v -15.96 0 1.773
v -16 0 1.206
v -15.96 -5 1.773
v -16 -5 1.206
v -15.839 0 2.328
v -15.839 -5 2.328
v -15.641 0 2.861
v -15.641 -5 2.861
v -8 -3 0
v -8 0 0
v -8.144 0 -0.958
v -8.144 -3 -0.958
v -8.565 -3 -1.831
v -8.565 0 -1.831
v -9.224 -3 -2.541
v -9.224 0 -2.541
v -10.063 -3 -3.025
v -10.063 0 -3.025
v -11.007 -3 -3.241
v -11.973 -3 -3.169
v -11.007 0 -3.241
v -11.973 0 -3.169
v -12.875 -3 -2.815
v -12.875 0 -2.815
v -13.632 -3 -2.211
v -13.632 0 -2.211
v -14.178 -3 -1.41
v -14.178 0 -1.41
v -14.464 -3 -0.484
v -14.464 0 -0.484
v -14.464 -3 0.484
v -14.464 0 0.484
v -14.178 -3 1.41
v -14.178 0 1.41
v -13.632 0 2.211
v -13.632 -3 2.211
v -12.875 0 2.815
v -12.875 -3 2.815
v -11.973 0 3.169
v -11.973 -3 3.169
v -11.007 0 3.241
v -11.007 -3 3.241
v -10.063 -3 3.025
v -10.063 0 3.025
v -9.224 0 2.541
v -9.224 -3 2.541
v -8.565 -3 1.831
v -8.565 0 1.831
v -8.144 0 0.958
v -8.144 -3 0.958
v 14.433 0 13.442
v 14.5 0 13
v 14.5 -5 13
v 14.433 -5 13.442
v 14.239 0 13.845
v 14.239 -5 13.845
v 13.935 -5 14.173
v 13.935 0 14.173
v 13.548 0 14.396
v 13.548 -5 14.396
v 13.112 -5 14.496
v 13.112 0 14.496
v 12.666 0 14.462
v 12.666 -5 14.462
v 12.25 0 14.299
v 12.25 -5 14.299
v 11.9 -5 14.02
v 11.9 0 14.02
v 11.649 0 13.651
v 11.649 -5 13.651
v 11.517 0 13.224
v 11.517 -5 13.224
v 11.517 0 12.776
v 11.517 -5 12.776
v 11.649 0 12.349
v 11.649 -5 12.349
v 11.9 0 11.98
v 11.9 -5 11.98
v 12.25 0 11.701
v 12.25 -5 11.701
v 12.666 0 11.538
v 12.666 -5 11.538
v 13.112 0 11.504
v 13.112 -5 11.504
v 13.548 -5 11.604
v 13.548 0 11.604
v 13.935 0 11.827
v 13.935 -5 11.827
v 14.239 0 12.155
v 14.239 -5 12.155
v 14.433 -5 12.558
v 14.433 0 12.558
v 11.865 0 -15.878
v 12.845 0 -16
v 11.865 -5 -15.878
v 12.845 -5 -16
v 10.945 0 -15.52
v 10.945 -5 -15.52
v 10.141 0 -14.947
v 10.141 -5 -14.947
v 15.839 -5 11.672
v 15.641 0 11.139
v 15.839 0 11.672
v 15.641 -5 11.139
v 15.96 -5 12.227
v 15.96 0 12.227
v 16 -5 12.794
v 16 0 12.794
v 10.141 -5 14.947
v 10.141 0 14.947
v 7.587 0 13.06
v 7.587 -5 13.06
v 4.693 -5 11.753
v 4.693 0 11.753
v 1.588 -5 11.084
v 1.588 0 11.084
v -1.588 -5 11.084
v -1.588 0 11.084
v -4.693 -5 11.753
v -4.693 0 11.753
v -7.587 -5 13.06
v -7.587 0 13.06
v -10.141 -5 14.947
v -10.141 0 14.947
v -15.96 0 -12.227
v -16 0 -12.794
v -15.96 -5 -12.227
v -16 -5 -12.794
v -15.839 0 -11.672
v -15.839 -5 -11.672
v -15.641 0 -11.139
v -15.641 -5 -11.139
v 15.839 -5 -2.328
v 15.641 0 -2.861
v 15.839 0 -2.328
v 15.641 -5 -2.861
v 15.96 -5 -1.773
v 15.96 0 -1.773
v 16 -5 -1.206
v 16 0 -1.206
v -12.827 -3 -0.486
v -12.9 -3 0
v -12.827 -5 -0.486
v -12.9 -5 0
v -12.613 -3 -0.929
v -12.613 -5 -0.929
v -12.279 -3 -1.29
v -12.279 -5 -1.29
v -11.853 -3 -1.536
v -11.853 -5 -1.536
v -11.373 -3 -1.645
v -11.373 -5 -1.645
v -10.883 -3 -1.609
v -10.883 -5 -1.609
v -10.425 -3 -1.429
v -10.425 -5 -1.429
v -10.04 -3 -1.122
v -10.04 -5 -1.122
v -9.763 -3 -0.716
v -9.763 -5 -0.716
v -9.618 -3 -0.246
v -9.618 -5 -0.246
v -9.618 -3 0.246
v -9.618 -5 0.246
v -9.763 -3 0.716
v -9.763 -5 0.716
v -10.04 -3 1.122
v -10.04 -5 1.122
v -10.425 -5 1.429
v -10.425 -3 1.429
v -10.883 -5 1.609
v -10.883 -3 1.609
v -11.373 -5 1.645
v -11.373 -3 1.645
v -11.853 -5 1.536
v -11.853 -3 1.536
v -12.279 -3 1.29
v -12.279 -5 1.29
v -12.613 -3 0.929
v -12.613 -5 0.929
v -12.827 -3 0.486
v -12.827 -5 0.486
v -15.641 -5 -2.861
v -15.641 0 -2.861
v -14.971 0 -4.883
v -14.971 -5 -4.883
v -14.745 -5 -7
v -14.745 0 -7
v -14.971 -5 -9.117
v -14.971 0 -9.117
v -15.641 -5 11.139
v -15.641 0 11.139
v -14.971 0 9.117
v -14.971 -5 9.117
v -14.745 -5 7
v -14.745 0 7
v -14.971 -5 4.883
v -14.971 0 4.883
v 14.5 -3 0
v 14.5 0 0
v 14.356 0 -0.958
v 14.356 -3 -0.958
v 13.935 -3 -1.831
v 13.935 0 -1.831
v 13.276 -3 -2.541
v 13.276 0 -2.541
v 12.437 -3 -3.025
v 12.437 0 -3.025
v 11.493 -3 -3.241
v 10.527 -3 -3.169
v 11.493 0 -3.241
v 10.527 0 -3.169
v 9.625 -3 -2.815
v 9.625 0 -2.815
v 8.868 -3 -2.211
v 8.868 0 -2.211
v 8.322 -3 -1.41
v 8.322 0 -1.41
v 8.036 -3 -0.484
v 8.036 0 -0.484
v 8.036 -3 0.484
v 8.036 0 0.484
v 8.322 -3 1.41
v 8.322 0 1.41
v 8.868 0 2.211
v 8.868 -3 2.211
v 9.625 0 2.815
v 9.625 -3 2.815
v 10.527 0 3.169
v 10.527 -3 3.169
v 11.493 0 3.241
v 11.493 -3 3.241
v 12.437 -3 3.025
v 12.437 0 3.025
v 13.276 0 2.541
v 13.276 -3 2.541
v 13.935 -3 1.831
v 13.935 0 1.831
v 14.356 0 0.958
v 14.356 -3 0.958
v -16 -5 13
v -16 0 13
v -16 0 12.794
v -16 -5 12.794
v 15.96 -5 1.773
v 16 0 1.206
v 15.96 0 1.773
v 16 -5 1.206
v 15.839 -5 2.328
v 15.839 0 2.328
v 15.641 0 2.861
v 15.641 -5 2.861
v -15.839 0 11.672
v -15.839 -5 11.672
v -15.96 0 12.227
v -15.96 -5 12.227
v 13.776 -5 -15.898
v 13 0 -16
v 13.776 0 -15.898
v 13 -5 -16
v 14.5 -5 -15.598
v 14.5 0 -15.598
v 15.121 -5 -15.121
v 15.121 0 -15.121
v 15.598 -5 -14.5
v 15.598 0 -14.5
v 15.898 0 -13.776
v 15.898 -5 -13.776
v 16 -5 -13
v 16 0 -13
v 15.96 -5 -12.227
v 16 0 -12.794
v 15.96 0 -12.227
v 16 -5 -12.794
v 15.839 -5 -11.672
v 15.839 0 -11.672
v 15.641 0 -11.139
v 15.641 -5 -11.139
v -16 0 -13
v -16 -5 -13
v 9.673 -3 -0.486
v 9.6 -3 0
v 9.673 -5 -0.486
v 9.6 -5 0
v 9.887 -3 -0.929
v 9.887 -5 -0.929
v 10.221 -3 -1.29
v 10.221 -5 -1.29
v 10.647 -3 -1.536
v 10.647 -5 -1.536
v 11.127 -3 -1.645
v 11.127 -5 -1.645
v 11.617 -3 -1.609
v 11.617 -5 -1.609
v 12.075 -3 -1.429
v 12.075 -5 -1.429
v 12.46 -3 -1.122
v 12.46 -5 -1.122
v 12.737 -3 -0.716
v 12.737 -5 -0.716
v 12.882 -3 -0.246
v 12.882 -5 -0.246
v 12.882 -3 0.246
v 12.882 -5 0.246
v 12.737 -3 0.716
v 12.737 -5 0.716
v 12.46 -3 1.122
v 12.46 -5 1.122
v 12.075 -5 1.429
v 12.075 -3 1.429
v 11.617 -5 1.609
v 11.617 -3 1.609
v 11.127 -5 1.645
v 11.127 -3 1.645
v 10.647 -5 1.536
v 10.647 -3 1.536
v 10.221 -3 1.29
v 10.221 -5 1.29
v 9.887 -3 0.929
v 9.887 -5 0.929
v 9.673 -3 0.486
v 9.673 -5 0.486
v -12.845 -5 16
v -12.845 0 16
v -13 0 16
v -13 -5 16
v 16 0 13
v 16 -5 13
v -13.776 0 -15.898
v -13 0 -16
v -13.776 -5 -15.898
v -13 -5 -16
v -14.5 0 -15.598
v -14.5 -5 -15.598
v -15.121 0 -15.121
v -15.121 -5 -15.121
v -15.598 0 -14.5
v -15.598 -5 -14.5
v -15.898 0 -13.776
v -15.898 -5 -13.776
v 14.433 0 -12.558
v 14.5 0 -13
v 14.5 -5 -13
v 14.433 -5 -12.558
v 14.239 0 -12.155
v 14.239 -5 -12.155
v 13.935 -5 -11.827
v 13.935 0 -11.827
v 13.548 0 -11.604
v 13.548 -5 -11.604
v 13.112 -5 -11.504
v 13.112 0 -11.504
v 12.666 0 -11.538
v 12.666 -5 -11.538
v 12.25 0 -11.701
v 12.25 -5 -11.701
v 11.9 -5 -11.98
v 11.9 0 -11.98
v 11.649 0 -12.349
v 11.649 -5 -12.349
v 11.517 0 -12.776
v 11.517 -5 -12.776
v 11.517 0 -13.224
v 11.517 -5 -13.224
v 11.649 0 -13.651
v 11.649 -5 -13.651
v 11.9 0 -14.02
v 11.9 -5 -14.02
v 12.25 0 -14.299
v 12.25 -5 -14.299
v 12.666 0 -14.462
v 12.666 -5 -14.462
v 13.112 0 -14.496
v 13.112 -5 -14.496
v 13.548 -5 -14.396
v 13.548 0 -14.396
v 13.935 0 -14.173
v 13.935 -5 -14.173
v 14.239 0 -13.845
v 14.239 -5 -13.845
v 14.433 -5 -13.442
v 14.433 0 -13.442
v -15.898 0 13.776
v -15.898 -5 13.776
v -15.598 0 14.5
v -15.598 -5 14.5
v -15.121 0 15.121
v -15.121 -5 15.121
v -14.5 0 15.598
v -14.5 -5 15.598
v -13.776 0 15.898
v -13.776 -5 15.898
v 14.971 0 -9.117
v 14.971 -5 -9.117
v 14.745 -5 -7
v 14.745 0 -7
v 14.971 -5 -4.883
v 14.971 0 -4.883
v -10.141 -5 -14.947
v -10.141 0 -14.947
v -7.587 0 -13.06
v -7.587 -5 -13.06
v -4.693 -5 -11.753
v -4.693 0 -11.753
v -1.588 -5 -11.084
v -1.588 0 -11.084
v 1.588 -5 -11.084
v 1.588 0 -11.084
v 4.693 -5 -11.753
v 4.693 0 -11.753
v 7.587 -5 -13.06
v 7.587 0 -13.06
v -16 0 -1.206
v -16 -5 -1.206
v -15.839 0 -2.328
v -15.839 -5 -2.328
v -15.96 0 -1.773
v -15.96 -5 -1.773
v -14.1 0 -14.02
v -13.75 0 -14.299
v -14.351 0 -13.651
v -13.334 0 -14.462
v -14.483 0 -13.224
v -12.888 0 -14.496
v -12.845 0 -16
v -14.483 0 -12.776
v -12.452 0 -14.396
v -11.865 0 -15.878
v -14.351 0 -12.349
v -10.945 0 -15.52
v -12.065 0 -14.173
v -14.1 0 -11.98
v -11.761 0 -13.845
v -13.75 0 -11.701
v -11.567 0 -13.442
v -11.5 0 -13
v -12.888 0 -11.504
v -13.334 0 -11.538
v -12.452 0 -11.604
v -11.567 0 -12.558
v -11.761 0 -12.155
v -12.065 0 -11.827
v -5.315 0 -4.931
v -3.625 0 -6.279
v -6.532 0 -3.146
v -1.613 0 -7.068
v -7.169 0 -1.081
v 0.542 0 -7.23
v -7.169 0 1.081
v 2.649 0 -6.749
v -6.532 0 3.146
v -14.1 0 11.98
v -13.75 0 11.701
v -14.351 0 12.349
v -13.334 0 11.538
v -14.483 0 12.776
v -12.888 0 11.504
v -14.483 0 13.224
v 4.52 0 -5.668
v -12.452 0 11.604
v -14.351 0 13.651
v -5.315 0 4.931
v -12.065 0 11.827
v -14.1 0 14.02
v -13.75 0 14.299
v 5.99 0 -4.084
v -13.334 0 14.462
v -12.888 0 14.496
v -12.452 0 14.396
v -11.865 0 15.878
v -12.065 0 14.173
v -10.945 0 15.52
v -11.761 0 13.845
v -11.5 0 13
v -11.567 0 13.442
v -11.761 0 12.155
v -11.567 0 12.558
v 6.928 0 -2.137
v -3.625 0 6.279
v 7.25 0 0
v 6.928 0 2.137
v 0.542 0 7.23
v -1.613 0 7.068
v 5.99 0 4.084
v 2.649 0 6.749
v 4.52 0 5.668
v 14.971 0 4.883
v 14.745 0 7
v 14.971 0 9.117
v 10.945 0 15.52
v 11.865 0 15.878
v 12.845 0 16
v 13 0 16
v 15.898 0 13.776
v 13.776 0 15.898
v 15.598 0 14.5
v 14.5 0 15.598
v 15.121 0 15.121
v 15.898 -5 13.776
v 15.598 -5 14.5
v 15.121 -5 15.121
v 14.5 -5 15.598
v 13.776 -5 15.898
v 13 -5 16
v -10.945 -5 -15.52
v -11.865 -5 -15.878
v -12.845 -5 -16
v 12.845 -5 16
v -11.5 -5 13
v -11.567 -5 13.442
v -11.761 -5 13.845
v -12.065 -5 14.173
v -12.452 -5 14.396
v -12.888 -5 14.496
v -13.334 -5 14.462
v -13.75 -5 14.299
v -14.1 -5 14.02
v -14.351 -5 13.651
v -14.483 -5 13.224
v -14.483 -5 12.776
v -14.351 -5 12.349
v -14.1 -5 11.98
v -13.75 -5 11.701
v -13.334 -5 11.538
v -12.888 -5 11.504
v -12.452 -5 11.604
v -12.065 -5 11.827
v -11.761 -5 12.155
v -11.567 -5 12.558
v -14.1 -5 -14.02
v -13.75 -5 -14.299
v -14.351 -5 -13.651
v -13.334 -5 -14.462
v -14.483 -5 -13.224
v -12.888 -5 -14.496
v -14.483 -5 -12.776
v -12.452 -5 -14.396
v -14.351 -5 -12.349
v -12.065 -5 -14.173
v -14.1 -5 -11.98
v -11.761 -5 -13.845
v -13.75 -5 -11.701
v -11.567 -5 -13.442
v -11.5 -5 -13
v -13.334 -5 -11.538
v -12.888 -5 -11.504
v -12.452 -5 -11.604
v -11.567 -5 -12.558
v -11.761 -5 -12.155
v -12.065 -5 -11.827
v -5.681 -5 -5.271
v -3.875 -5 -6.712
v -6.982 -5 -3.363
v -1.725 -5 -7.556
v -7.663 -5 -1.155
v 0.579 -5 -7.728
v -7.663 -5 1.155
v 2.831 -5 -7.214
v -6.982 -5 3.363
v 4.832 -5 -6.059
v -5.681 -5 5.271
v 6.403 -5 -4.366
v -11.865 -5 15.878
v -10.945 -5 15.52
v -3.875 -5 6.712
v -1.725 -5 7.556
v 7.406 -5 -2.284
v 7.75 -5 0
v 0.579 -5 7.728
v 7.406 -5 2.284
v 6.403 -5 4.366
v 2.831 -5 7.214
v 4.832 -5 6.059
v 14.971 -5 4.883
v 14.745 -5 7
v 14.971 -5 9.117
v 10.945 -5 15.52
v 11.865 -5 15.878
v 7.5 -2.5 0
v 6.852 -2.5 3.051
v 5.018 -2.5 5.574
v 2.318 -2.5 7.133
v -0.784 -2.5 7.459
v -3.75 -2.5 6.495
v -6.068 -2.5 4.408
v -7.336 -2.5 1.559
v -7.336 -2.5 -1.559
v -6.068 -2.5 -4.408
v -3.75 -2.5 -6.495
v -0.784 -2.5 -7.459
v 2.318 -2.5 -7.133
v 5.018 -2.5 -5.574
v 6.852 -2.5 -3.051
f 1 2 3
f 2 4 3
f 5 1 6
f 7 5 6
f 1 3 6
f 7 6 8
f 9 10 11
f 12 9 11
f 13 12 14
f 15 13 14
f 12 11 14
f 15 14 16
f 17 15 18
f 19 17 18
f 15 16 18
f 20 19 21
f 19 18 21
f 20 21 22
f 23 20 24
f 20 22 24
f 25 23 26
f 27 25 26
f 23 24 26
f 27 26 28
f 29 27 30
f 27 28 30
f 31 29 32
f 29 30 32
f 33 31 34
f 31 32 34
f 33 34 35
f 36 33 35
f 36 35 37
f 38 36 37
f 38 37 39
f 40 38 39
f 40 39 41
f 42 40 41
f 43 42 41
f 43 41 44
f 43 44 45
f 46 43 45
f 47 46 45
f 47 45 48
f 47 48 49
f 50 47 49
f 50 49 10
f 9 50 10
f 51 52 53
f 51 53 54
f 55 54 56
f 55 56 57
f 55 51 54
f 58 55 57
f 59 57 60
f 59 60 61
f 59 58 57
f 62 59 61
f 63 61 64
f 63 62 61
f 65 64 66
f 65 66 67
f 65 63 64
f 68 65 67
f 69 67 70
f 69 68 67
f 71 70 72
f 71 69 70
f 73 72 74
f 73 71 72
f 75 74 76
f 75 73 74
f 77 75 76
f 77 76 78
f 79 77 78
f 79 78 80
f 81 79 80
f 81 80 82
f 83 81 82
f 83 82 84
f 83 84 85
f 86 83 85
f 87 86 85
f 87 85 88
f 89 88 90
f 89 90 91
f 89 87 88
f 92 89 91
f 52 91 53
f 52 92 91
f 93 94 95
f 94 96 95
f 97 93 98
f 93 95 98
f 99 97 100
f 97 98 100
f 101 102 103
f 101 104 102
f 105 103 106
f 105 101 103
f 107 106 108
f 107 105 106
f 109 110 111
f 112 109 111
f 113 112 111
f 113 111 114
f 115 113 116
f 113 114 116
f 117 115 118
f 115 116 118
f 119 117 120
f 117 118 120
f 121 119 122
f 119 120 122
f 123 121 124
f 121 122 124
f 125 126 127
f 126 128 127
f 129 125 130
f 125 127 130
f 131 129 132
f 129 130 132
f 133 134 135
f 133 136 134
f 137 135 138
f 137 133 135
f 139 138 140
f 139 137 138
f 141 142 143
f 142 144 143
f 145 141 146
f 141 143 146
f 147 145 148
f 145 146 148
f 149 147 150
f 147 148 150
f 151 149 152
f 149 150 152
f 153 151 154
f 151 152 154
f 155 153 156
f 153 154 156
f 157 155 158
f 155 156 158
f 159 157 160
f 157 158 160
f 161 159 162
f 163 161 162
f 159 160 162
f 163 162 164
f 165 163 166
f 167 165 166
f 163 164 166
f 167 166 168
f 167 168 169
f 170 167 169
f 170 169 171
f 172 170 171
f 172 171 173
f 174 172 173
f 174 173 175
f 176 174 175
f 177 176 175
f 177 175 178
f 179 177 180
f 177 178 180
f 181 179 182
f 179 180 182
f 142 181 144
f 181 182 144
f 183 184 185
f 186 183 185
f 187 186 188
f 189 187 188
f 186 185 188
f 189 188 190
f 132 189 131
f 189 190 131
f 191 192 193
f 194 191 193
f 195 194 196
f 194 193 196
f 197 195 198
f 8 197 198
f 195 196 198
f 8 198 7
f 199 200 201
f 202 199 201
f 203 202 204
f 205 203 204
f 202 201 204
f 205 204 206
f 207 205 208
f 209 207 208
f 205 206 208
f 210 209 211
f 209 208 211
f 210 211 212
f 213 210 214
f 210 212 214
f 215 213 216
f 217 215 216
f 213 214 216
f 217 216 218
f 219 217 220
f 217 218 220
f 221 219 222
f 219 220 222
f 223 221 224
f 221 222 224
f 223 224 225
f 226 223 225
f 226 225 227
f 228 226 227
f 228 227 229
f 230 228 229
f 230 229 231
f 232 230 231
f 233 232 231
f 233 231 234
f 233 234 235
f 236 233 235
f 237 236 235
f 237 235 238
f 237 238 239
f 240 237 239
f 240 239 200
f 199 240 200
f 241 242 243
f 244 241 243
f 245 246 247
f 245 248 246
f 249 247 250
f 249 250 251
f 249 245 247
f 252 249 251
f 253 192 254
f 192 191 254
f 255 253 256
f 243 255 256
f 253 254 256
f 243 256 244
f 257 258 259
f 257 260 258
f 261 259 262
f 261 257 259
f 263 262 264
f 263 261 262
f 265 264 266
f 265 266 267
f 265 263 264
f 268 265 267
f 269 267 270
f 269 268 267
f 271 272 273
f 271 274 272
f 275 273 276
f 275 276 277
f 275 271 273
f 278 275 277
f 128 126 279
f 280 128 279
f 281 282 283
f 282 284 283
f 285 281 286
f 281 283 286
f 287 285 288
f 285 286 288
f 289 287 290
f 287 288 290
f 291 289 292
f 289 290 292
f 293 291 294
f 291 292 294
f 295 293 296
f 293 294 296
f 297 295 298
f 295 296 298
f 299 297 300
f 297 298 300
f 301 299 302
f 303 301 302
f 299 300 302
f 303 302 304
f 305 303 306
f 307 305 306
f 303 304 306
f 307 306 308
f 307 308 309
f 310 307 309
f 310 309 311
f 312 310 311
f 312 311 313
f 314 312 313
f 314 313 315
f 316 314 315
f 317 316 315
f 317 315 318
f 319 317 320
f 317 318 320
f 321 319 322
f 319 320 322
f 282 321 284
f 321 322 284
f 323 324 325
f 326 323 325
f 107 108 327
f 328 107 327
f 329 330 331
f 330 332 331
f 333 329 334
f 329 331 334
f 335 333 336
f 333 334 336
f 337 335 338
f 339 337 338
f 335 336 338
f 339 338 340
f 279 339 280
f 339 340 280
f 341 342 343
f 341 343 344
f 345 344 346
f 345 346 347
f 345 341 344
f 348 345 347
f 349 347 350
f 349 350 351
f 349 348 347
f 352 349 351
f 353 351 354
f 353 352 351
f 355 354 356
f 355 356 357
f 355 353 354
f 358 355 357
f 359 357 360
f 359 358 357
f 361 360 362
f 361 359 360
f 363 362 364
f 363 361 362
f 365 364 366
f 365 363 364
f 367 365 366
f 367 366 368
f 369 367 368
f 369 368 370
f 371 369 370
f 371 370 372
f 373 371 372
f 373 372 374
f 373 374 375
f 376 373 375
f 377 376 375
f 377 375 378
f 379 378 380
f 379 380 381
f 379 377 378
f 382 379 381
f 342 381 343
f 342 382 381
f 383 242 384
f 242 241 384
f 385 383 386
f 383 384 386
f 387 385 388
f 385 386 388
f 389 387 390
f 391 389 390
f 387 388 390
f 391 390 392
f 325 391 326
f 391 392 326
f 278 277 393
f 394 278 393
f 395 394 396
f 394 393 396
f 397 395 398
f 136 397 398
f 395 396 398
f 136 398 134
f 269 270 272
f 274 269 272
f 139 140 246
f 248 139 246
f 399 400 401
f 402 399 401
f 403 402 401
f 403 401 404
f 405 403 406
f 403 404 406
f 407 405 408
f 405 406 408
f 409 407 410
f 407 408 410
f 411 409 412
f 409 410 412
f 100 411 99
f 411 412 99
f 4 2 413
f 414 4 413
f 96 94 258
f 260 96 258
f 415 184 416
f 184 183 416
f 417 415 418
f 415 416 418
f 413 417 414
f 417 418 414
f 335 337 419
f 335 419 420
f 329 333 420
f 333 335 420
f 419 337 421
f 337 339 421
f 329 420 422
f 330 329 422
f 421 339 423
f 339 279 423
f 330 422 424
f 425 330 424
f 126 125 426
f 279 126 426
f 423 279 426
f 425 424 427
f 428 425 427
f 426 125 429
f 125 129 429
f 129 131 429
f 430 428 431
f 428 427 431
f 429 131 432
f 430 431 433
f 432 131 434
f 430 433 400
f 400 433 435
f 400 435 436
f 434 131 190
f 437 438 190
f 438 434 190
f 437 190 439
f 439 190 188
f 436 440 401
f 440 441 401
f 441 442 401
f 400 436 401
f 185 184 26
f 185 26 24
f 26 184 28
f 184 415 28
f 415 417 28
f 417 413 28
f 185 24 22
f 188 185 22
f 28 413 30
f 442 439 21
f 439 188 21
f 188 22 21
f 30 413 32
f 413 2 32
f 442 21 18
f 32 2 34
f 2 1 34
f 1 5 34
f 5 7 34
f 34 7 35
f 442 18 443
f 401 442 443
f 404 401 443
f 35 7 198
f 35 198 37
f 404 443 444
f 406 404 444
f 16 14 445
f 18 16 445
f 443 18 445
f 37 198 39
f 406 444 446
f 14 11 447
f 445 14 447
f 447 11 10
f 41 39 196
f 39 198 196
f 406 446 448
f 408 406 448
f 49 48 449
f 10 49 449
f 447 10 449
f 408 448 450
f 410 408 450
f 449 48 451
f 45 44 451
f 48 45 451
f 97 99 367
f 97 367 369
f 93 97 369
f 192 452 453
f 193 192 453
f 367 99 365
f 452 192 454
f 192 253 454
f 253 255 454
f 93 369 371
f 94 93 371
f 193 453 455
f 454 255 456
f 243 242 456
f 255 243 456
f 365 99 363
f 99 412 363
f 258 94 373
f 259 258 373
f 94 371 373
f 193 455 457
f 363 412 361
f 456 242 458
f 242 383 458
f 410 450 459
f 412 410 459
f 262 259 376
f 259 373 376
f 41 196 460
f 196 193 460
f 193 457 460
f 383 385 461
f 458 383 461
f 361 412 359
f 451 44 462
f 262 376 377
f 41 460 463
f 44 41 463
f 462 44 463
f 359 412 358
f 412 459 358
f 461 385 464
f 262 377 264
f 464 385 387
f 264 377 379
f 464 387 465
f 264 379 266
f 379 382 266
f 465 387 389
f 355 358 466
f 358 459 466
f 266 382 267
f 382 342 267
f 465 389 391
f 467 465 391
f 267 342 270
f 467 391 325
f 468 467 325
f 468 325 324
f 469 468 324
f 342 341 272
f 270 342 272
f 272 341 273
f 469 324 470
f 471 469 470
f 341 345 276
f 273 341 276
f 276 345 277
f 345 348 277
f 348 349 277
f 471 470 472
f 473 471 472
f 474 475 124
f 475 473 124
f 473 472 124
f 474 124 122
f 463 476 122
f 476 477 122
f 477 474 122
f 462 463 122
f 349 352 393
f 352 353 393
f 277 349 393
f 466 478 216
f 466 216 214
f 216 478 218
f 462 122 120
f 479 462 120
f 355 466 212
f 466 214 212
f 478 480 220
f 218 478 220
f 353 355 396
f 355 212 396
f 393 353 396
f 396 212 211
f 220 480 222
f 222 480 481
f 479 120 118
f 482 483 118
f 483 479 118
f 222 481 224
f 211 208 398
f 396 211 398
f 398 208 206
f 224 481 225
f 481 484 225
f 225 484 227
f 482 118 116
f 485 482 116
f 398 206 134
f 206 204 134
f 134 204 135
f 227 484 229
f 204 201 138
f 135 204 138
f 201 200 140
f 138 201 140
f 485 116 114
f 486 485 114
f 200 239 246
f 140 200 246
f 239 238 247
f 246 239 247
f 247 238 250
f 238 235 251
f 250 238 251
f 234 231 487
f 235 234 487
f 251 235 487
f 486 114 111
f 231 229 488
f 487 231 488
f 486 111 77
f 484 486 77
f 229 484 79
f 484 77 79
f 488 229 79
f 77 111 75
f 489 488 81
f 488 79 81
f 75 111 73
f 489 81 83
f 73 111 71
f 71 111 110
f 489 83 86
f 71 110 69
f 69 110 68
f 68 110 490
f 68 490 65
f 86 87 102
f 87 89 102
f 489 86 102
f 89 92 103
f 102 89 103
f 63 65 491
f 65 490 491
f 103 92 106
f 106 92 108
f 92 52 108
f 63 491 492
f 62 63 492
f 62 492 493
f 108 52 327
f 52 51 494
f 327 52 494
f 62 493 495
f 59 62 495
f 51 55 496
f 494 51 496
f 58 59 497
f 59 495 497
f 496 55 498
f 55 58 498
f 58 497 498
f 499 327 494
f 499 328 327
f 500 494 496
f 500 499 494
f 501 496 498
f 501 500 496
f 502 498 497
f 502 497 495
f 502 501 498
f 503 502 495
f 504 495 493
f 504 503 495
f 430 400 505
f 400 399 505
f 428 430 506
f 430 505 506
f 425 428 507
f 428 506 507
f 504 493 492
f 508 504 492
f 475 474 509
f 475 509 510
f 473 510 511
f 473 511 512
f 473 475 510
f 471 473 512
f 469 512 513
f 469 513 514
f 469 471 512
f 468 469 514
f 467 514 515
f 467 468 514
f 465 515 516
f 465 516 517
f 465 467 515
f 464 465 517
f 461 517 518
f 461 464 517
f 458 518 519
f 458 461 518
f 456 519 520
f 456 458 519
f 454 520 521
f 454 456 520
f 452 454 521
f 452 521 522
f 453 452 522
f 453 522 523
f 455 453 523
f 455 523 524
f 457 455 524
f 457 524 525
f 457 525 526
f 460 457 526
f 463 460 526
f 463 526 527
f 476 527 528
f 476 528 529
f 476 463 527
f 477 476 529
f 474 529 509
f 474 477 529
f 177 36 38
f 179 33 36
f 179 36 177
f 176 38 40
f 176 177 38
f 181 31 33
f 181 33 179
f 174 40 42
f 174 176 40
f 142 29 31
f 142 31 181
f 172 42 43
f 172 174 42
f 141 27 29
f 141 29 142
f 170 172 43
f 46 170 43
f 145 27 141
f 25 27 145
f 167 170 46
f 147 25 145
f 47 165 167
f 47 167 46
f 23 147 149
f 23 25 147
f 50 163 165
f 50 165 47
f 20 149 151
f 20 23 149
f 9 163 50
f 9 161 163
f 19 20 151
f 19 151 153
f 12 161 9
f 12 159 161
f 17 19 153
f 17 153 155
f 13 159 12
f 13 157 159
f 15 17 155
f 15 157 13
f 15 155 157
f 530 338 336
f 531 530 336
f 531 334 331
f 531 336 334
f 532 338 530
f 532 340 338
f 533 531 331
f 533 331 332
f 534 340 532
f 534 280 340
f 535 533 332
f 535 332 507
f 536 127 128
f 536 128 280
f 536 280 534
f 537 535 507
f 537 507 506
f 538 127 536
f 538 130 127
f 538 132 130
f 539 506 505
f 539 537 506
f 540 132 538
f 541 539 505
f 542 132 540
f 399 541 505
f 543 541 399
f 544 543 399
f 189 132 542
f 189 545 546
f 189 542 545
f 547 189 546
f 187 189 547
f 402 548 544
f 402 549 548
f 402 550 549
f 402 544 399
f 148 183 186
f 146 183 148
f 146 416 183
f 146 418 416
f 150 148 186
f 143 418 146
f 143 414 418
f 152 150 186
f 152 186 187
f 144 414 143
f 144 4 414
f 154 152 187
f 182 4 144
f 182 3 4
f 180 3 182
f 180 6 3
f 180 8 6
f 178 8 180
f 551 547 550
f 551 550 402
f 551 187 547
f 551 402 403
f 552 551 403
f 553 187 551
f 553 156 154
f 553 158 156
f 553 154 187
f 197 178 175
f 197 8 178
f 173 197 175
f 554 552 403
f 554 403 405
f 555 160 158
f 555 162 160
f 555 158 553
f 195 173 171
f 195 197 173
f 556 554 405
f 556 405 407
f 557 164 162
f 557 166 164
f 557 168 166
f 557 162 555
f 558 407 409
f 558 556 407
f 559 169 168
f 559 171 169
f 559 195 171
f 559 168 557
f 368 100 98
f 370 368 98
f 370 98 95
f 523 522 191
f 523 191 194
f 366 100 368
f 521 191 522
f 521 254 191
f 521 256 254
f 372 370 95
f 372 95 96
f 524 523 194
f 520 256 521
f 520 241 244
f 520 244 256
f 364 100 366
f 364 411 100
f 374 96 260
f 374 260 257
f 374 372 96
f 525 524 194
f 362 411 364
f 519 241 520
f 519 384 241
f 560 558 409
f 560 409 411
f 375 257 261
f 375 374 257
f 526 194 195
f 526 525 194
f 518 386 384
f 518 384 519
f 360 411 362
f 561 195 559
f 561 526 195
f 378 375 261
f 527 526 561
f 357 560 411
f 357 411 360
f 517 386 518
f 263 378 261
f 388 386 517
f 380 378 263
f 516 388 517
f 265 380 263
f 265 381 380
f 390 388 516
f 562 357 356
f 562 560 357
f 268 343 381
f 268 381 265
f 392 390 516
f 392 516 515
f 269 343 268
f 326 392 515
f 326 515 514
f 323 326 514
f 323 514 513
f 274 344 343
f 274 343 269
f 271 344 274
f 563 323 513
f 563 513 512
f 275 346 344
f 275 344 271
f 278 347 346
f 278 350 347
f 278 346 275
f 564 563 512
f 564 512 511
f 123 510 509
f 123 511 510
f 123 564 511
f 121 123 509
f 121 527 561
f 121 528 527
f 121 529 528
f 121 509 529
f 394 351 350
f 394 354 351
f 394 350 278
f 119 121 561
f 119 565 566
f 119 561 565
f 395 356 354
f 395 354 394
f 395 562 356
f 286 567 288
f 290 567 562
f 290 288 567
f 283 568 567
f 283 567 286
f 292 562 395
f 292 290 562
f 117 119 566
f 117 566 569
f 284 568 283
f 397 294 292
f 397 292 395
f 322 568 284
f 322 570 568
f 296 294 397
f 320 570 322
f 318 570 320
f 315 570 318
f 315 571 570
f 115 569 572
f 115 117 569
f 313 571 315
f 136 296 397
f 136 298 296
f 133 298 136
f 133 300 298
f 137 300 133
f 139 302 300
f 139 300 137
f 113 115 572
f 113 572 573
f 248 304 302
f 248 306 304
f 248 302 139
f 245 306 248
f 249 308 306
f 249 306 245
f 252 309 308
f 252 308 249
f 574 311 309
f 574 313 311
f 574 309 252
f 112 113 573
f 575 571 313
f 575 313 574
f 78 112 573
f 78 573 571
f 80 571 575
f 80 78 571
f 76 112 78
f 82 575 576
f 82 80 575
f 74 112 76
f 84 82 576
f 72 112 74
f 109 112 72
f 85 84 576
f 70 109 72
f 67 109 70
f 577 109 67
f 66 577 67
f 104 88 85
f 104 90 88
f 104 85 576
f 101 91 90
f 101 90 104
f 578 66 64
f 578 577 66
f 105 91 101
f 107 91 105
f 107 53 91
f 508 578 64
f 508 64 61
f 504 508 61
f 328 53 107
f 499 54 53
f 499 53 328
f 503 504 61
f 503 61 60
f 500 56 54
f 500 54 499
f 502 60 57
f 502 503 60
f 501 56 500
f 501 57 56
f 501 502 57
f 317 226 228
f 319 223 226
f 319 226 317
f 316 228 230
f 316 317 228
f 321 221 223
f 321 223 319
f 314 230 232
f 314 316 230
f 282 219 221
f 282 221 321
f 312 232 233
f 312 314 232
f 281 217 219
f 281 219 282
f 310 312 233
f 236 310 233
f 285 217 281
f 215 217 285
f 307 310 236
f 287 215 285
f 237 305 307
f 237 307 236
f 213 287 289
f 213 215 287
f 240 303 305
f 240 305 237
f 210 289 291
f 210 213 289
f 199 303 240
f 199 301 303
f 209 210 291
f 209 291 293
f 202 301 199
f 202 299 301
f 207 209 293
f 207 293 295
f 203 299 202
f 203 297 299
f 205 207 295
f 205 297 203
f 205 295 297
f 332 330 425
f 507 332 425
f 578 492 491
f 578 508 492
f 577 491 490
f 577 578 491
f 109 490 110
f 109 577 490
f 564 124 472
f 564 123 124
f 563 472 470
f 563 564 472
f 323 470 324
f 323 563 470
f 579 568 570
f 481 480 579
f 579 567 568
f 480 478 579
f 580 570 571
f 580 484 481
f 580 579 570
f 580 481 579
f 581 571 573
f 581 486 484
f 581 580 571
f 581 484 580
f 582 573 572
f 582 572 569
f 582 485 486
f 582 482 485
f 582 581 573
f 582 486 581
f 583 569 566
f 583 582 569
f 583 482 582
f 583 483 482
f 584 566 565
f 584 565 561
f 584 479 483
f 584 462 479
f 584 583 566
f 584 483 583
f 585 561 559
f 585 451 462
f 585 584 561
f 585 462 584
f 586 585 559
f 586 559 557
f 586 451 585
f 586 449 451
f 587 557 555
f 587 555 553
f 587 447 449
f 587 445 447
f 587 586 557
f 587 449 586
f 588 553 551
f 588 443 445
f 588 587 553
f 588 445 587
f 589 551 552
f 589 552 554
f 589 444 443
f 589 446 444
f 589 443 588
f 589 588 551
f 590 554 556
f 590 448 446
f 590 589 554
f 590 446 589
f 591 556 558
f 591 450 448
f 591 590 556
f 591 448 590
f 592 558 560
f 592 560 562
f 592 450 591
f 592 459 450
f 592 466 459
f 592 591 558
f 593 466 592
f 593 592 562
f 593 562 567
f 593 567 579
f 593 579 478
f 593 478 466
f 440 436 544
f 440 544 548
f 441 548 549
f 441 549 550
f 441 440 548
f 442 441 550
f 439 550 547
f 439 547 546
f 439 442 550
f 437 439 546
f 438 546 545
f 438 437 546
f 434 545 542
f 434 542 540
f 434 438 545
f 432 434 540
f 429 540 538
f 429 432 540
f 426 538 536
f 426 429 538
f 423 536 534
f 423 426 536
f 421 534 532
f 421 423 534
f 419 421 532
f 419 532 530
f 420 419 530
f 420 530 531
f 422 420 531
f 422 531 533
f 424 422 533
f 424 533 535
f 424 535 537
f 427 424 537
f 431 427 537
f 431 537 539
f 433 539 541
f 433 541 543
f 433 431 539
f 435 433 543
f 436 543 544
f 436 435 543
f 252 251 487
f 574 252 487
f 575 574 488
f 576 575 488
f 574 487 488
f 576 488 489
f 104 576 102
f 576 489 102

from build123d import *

# Parameters (mm, degrees)
F0_R           = 1.5
F0_R_2         = 7.25
F1_DEPTH       = 5
F2_R           = 3
F3_SIZE2       = 4.99999
F3_SIZE        = 0.49999
F4_D           = 3.3
F4_CBORE_D     = 6.5
F4_CBORE_DEPTH = 3
F5_R           = 4


# Not quite as in the source:
# - a fillet or chamfer is up to 0.001 mm smaller than in the source, because OpenCascade refuses the exact size


with BuildPart() as f1:
    # F0 (on Front) → F1 (new body)
    with BuildSketch(Plane.XZ):
        with BuildLine():
            Line((11.1803398875, -16), (16, -16))
            Line((16, -16), (16, -11.8509778157))
            ThreePointArc((16, -11.8509778157), (14.7445991464, -7), (16, -2.1490221843))
            Line((16, -2.1490221843), (16, 2.1490221843))
            ThreePointArc((16, 2.1490221843), (14.7445991464, 7), (16, 11.8509778157))
            Line((16, 11.8509778157), (16, 16))
            Line((16, 16), (11.1803398875, 16))
            ThreePointArc((11.1803398875, 16), (0, 11), (-11.1803398875, 16))
            Line((-11.1803398875, 16), (-16, 16))
            Line((-16, 16), (-16, 11.8509778157))
            ThreePointArc((-16, 11.8509778157), (-14.7445991464, 7), (-16, 2.1490221843))
            Line((-16, 2.1490221843), (-16, -2.1490221843))
            ThreePointArc((-16, -2.1490221843), (-14.7445991464, -7), (-16, -11.8509778157))
            Line((-16, -11.8509778157), (-16, -16))
            Line((-16, -16), (-11.1803398875, -16))
            ThreePointArc((-11.1803398875, -16), (0, -11), (11.1803398875, -16))
        make_face()
        with Locations((-13, -13)):
            Circle(F0_R, mode=Mode.SUBTRACT)
        with Locations((13, -13)):
            Circle(F0_R, mode=Mode.SUBTRACT)
        with Locations((-13, 13)):
            Circle(F0_R, mode=Mode.SUBTRACT)
        Circle(F0_R_2, mode=Mode.SUBTRACT)
        with Locations((13, 13)):
            Circle(F0_R, mode=Mode.SUBTRACT)
    extrude(amount=F1_DEPTH)

    # F2
    f2_edges = [f1.edges().sort_by_distance(p)[0] for p in [
        (-16, -2.5, 16),
        (16, -2.5, 16),
        (16, -2.5, -16),
        (-16, -2.5, -16),
    ]]
    fillet(f2_edges, radius=F2_R)

    # F3 (size 0.5 and 5 in the source; OpenCascade refuses exactly that, so slightly less here)
    f3_edges = [f1.edges().sort_by_distance(p)[0] for p in [
        (-7.25, -5, 0),
    ]]
    f3_side = f1.faces().sort_by_distance((-15.547452, -5, -12.425489))[0]
    chamfer(f3_edges, length=F3_SIZE, length2=F3_SIZE2, reference=f3_side)

    # F4 (through all)
    with Locations(Plane(origin=(0, 0, 0), x_dir=(1, 0, 0), z_dir=(0, 1, 0))):
        with Locations((11.25, 0), (-11.25, 0)):
            CounterBoreHole(F4_D / 2, F4_CBORE_D / 2, F4_CBORE_DEPTH)

    # F5
    f5_edges = [f1.edges().sort_by_distance(p)[0] for p in [
        (-16, -2.5, -2.149022),
        (-16, -2.5, 2.149022),
        (-16, -2.5, 13),
        (11.18034, -2.5, 16),
        (16, -2.5, 2.149022),
        (16, -2.5, -2.149022),
        (11.18034, -2.5, -16),
        (-16, -2.5, -11.850978),
        (-11.18034, -2.5, -16),
        (-16, -2.5, 11.850978),
        (16, -2.5, -11.850978),
        (-11.18034, -2.5, 16),
        (16, -2.5, 11.850978),
    ]]
    fillet(f5_edges, radius=F5_R)


solid = f1.part
